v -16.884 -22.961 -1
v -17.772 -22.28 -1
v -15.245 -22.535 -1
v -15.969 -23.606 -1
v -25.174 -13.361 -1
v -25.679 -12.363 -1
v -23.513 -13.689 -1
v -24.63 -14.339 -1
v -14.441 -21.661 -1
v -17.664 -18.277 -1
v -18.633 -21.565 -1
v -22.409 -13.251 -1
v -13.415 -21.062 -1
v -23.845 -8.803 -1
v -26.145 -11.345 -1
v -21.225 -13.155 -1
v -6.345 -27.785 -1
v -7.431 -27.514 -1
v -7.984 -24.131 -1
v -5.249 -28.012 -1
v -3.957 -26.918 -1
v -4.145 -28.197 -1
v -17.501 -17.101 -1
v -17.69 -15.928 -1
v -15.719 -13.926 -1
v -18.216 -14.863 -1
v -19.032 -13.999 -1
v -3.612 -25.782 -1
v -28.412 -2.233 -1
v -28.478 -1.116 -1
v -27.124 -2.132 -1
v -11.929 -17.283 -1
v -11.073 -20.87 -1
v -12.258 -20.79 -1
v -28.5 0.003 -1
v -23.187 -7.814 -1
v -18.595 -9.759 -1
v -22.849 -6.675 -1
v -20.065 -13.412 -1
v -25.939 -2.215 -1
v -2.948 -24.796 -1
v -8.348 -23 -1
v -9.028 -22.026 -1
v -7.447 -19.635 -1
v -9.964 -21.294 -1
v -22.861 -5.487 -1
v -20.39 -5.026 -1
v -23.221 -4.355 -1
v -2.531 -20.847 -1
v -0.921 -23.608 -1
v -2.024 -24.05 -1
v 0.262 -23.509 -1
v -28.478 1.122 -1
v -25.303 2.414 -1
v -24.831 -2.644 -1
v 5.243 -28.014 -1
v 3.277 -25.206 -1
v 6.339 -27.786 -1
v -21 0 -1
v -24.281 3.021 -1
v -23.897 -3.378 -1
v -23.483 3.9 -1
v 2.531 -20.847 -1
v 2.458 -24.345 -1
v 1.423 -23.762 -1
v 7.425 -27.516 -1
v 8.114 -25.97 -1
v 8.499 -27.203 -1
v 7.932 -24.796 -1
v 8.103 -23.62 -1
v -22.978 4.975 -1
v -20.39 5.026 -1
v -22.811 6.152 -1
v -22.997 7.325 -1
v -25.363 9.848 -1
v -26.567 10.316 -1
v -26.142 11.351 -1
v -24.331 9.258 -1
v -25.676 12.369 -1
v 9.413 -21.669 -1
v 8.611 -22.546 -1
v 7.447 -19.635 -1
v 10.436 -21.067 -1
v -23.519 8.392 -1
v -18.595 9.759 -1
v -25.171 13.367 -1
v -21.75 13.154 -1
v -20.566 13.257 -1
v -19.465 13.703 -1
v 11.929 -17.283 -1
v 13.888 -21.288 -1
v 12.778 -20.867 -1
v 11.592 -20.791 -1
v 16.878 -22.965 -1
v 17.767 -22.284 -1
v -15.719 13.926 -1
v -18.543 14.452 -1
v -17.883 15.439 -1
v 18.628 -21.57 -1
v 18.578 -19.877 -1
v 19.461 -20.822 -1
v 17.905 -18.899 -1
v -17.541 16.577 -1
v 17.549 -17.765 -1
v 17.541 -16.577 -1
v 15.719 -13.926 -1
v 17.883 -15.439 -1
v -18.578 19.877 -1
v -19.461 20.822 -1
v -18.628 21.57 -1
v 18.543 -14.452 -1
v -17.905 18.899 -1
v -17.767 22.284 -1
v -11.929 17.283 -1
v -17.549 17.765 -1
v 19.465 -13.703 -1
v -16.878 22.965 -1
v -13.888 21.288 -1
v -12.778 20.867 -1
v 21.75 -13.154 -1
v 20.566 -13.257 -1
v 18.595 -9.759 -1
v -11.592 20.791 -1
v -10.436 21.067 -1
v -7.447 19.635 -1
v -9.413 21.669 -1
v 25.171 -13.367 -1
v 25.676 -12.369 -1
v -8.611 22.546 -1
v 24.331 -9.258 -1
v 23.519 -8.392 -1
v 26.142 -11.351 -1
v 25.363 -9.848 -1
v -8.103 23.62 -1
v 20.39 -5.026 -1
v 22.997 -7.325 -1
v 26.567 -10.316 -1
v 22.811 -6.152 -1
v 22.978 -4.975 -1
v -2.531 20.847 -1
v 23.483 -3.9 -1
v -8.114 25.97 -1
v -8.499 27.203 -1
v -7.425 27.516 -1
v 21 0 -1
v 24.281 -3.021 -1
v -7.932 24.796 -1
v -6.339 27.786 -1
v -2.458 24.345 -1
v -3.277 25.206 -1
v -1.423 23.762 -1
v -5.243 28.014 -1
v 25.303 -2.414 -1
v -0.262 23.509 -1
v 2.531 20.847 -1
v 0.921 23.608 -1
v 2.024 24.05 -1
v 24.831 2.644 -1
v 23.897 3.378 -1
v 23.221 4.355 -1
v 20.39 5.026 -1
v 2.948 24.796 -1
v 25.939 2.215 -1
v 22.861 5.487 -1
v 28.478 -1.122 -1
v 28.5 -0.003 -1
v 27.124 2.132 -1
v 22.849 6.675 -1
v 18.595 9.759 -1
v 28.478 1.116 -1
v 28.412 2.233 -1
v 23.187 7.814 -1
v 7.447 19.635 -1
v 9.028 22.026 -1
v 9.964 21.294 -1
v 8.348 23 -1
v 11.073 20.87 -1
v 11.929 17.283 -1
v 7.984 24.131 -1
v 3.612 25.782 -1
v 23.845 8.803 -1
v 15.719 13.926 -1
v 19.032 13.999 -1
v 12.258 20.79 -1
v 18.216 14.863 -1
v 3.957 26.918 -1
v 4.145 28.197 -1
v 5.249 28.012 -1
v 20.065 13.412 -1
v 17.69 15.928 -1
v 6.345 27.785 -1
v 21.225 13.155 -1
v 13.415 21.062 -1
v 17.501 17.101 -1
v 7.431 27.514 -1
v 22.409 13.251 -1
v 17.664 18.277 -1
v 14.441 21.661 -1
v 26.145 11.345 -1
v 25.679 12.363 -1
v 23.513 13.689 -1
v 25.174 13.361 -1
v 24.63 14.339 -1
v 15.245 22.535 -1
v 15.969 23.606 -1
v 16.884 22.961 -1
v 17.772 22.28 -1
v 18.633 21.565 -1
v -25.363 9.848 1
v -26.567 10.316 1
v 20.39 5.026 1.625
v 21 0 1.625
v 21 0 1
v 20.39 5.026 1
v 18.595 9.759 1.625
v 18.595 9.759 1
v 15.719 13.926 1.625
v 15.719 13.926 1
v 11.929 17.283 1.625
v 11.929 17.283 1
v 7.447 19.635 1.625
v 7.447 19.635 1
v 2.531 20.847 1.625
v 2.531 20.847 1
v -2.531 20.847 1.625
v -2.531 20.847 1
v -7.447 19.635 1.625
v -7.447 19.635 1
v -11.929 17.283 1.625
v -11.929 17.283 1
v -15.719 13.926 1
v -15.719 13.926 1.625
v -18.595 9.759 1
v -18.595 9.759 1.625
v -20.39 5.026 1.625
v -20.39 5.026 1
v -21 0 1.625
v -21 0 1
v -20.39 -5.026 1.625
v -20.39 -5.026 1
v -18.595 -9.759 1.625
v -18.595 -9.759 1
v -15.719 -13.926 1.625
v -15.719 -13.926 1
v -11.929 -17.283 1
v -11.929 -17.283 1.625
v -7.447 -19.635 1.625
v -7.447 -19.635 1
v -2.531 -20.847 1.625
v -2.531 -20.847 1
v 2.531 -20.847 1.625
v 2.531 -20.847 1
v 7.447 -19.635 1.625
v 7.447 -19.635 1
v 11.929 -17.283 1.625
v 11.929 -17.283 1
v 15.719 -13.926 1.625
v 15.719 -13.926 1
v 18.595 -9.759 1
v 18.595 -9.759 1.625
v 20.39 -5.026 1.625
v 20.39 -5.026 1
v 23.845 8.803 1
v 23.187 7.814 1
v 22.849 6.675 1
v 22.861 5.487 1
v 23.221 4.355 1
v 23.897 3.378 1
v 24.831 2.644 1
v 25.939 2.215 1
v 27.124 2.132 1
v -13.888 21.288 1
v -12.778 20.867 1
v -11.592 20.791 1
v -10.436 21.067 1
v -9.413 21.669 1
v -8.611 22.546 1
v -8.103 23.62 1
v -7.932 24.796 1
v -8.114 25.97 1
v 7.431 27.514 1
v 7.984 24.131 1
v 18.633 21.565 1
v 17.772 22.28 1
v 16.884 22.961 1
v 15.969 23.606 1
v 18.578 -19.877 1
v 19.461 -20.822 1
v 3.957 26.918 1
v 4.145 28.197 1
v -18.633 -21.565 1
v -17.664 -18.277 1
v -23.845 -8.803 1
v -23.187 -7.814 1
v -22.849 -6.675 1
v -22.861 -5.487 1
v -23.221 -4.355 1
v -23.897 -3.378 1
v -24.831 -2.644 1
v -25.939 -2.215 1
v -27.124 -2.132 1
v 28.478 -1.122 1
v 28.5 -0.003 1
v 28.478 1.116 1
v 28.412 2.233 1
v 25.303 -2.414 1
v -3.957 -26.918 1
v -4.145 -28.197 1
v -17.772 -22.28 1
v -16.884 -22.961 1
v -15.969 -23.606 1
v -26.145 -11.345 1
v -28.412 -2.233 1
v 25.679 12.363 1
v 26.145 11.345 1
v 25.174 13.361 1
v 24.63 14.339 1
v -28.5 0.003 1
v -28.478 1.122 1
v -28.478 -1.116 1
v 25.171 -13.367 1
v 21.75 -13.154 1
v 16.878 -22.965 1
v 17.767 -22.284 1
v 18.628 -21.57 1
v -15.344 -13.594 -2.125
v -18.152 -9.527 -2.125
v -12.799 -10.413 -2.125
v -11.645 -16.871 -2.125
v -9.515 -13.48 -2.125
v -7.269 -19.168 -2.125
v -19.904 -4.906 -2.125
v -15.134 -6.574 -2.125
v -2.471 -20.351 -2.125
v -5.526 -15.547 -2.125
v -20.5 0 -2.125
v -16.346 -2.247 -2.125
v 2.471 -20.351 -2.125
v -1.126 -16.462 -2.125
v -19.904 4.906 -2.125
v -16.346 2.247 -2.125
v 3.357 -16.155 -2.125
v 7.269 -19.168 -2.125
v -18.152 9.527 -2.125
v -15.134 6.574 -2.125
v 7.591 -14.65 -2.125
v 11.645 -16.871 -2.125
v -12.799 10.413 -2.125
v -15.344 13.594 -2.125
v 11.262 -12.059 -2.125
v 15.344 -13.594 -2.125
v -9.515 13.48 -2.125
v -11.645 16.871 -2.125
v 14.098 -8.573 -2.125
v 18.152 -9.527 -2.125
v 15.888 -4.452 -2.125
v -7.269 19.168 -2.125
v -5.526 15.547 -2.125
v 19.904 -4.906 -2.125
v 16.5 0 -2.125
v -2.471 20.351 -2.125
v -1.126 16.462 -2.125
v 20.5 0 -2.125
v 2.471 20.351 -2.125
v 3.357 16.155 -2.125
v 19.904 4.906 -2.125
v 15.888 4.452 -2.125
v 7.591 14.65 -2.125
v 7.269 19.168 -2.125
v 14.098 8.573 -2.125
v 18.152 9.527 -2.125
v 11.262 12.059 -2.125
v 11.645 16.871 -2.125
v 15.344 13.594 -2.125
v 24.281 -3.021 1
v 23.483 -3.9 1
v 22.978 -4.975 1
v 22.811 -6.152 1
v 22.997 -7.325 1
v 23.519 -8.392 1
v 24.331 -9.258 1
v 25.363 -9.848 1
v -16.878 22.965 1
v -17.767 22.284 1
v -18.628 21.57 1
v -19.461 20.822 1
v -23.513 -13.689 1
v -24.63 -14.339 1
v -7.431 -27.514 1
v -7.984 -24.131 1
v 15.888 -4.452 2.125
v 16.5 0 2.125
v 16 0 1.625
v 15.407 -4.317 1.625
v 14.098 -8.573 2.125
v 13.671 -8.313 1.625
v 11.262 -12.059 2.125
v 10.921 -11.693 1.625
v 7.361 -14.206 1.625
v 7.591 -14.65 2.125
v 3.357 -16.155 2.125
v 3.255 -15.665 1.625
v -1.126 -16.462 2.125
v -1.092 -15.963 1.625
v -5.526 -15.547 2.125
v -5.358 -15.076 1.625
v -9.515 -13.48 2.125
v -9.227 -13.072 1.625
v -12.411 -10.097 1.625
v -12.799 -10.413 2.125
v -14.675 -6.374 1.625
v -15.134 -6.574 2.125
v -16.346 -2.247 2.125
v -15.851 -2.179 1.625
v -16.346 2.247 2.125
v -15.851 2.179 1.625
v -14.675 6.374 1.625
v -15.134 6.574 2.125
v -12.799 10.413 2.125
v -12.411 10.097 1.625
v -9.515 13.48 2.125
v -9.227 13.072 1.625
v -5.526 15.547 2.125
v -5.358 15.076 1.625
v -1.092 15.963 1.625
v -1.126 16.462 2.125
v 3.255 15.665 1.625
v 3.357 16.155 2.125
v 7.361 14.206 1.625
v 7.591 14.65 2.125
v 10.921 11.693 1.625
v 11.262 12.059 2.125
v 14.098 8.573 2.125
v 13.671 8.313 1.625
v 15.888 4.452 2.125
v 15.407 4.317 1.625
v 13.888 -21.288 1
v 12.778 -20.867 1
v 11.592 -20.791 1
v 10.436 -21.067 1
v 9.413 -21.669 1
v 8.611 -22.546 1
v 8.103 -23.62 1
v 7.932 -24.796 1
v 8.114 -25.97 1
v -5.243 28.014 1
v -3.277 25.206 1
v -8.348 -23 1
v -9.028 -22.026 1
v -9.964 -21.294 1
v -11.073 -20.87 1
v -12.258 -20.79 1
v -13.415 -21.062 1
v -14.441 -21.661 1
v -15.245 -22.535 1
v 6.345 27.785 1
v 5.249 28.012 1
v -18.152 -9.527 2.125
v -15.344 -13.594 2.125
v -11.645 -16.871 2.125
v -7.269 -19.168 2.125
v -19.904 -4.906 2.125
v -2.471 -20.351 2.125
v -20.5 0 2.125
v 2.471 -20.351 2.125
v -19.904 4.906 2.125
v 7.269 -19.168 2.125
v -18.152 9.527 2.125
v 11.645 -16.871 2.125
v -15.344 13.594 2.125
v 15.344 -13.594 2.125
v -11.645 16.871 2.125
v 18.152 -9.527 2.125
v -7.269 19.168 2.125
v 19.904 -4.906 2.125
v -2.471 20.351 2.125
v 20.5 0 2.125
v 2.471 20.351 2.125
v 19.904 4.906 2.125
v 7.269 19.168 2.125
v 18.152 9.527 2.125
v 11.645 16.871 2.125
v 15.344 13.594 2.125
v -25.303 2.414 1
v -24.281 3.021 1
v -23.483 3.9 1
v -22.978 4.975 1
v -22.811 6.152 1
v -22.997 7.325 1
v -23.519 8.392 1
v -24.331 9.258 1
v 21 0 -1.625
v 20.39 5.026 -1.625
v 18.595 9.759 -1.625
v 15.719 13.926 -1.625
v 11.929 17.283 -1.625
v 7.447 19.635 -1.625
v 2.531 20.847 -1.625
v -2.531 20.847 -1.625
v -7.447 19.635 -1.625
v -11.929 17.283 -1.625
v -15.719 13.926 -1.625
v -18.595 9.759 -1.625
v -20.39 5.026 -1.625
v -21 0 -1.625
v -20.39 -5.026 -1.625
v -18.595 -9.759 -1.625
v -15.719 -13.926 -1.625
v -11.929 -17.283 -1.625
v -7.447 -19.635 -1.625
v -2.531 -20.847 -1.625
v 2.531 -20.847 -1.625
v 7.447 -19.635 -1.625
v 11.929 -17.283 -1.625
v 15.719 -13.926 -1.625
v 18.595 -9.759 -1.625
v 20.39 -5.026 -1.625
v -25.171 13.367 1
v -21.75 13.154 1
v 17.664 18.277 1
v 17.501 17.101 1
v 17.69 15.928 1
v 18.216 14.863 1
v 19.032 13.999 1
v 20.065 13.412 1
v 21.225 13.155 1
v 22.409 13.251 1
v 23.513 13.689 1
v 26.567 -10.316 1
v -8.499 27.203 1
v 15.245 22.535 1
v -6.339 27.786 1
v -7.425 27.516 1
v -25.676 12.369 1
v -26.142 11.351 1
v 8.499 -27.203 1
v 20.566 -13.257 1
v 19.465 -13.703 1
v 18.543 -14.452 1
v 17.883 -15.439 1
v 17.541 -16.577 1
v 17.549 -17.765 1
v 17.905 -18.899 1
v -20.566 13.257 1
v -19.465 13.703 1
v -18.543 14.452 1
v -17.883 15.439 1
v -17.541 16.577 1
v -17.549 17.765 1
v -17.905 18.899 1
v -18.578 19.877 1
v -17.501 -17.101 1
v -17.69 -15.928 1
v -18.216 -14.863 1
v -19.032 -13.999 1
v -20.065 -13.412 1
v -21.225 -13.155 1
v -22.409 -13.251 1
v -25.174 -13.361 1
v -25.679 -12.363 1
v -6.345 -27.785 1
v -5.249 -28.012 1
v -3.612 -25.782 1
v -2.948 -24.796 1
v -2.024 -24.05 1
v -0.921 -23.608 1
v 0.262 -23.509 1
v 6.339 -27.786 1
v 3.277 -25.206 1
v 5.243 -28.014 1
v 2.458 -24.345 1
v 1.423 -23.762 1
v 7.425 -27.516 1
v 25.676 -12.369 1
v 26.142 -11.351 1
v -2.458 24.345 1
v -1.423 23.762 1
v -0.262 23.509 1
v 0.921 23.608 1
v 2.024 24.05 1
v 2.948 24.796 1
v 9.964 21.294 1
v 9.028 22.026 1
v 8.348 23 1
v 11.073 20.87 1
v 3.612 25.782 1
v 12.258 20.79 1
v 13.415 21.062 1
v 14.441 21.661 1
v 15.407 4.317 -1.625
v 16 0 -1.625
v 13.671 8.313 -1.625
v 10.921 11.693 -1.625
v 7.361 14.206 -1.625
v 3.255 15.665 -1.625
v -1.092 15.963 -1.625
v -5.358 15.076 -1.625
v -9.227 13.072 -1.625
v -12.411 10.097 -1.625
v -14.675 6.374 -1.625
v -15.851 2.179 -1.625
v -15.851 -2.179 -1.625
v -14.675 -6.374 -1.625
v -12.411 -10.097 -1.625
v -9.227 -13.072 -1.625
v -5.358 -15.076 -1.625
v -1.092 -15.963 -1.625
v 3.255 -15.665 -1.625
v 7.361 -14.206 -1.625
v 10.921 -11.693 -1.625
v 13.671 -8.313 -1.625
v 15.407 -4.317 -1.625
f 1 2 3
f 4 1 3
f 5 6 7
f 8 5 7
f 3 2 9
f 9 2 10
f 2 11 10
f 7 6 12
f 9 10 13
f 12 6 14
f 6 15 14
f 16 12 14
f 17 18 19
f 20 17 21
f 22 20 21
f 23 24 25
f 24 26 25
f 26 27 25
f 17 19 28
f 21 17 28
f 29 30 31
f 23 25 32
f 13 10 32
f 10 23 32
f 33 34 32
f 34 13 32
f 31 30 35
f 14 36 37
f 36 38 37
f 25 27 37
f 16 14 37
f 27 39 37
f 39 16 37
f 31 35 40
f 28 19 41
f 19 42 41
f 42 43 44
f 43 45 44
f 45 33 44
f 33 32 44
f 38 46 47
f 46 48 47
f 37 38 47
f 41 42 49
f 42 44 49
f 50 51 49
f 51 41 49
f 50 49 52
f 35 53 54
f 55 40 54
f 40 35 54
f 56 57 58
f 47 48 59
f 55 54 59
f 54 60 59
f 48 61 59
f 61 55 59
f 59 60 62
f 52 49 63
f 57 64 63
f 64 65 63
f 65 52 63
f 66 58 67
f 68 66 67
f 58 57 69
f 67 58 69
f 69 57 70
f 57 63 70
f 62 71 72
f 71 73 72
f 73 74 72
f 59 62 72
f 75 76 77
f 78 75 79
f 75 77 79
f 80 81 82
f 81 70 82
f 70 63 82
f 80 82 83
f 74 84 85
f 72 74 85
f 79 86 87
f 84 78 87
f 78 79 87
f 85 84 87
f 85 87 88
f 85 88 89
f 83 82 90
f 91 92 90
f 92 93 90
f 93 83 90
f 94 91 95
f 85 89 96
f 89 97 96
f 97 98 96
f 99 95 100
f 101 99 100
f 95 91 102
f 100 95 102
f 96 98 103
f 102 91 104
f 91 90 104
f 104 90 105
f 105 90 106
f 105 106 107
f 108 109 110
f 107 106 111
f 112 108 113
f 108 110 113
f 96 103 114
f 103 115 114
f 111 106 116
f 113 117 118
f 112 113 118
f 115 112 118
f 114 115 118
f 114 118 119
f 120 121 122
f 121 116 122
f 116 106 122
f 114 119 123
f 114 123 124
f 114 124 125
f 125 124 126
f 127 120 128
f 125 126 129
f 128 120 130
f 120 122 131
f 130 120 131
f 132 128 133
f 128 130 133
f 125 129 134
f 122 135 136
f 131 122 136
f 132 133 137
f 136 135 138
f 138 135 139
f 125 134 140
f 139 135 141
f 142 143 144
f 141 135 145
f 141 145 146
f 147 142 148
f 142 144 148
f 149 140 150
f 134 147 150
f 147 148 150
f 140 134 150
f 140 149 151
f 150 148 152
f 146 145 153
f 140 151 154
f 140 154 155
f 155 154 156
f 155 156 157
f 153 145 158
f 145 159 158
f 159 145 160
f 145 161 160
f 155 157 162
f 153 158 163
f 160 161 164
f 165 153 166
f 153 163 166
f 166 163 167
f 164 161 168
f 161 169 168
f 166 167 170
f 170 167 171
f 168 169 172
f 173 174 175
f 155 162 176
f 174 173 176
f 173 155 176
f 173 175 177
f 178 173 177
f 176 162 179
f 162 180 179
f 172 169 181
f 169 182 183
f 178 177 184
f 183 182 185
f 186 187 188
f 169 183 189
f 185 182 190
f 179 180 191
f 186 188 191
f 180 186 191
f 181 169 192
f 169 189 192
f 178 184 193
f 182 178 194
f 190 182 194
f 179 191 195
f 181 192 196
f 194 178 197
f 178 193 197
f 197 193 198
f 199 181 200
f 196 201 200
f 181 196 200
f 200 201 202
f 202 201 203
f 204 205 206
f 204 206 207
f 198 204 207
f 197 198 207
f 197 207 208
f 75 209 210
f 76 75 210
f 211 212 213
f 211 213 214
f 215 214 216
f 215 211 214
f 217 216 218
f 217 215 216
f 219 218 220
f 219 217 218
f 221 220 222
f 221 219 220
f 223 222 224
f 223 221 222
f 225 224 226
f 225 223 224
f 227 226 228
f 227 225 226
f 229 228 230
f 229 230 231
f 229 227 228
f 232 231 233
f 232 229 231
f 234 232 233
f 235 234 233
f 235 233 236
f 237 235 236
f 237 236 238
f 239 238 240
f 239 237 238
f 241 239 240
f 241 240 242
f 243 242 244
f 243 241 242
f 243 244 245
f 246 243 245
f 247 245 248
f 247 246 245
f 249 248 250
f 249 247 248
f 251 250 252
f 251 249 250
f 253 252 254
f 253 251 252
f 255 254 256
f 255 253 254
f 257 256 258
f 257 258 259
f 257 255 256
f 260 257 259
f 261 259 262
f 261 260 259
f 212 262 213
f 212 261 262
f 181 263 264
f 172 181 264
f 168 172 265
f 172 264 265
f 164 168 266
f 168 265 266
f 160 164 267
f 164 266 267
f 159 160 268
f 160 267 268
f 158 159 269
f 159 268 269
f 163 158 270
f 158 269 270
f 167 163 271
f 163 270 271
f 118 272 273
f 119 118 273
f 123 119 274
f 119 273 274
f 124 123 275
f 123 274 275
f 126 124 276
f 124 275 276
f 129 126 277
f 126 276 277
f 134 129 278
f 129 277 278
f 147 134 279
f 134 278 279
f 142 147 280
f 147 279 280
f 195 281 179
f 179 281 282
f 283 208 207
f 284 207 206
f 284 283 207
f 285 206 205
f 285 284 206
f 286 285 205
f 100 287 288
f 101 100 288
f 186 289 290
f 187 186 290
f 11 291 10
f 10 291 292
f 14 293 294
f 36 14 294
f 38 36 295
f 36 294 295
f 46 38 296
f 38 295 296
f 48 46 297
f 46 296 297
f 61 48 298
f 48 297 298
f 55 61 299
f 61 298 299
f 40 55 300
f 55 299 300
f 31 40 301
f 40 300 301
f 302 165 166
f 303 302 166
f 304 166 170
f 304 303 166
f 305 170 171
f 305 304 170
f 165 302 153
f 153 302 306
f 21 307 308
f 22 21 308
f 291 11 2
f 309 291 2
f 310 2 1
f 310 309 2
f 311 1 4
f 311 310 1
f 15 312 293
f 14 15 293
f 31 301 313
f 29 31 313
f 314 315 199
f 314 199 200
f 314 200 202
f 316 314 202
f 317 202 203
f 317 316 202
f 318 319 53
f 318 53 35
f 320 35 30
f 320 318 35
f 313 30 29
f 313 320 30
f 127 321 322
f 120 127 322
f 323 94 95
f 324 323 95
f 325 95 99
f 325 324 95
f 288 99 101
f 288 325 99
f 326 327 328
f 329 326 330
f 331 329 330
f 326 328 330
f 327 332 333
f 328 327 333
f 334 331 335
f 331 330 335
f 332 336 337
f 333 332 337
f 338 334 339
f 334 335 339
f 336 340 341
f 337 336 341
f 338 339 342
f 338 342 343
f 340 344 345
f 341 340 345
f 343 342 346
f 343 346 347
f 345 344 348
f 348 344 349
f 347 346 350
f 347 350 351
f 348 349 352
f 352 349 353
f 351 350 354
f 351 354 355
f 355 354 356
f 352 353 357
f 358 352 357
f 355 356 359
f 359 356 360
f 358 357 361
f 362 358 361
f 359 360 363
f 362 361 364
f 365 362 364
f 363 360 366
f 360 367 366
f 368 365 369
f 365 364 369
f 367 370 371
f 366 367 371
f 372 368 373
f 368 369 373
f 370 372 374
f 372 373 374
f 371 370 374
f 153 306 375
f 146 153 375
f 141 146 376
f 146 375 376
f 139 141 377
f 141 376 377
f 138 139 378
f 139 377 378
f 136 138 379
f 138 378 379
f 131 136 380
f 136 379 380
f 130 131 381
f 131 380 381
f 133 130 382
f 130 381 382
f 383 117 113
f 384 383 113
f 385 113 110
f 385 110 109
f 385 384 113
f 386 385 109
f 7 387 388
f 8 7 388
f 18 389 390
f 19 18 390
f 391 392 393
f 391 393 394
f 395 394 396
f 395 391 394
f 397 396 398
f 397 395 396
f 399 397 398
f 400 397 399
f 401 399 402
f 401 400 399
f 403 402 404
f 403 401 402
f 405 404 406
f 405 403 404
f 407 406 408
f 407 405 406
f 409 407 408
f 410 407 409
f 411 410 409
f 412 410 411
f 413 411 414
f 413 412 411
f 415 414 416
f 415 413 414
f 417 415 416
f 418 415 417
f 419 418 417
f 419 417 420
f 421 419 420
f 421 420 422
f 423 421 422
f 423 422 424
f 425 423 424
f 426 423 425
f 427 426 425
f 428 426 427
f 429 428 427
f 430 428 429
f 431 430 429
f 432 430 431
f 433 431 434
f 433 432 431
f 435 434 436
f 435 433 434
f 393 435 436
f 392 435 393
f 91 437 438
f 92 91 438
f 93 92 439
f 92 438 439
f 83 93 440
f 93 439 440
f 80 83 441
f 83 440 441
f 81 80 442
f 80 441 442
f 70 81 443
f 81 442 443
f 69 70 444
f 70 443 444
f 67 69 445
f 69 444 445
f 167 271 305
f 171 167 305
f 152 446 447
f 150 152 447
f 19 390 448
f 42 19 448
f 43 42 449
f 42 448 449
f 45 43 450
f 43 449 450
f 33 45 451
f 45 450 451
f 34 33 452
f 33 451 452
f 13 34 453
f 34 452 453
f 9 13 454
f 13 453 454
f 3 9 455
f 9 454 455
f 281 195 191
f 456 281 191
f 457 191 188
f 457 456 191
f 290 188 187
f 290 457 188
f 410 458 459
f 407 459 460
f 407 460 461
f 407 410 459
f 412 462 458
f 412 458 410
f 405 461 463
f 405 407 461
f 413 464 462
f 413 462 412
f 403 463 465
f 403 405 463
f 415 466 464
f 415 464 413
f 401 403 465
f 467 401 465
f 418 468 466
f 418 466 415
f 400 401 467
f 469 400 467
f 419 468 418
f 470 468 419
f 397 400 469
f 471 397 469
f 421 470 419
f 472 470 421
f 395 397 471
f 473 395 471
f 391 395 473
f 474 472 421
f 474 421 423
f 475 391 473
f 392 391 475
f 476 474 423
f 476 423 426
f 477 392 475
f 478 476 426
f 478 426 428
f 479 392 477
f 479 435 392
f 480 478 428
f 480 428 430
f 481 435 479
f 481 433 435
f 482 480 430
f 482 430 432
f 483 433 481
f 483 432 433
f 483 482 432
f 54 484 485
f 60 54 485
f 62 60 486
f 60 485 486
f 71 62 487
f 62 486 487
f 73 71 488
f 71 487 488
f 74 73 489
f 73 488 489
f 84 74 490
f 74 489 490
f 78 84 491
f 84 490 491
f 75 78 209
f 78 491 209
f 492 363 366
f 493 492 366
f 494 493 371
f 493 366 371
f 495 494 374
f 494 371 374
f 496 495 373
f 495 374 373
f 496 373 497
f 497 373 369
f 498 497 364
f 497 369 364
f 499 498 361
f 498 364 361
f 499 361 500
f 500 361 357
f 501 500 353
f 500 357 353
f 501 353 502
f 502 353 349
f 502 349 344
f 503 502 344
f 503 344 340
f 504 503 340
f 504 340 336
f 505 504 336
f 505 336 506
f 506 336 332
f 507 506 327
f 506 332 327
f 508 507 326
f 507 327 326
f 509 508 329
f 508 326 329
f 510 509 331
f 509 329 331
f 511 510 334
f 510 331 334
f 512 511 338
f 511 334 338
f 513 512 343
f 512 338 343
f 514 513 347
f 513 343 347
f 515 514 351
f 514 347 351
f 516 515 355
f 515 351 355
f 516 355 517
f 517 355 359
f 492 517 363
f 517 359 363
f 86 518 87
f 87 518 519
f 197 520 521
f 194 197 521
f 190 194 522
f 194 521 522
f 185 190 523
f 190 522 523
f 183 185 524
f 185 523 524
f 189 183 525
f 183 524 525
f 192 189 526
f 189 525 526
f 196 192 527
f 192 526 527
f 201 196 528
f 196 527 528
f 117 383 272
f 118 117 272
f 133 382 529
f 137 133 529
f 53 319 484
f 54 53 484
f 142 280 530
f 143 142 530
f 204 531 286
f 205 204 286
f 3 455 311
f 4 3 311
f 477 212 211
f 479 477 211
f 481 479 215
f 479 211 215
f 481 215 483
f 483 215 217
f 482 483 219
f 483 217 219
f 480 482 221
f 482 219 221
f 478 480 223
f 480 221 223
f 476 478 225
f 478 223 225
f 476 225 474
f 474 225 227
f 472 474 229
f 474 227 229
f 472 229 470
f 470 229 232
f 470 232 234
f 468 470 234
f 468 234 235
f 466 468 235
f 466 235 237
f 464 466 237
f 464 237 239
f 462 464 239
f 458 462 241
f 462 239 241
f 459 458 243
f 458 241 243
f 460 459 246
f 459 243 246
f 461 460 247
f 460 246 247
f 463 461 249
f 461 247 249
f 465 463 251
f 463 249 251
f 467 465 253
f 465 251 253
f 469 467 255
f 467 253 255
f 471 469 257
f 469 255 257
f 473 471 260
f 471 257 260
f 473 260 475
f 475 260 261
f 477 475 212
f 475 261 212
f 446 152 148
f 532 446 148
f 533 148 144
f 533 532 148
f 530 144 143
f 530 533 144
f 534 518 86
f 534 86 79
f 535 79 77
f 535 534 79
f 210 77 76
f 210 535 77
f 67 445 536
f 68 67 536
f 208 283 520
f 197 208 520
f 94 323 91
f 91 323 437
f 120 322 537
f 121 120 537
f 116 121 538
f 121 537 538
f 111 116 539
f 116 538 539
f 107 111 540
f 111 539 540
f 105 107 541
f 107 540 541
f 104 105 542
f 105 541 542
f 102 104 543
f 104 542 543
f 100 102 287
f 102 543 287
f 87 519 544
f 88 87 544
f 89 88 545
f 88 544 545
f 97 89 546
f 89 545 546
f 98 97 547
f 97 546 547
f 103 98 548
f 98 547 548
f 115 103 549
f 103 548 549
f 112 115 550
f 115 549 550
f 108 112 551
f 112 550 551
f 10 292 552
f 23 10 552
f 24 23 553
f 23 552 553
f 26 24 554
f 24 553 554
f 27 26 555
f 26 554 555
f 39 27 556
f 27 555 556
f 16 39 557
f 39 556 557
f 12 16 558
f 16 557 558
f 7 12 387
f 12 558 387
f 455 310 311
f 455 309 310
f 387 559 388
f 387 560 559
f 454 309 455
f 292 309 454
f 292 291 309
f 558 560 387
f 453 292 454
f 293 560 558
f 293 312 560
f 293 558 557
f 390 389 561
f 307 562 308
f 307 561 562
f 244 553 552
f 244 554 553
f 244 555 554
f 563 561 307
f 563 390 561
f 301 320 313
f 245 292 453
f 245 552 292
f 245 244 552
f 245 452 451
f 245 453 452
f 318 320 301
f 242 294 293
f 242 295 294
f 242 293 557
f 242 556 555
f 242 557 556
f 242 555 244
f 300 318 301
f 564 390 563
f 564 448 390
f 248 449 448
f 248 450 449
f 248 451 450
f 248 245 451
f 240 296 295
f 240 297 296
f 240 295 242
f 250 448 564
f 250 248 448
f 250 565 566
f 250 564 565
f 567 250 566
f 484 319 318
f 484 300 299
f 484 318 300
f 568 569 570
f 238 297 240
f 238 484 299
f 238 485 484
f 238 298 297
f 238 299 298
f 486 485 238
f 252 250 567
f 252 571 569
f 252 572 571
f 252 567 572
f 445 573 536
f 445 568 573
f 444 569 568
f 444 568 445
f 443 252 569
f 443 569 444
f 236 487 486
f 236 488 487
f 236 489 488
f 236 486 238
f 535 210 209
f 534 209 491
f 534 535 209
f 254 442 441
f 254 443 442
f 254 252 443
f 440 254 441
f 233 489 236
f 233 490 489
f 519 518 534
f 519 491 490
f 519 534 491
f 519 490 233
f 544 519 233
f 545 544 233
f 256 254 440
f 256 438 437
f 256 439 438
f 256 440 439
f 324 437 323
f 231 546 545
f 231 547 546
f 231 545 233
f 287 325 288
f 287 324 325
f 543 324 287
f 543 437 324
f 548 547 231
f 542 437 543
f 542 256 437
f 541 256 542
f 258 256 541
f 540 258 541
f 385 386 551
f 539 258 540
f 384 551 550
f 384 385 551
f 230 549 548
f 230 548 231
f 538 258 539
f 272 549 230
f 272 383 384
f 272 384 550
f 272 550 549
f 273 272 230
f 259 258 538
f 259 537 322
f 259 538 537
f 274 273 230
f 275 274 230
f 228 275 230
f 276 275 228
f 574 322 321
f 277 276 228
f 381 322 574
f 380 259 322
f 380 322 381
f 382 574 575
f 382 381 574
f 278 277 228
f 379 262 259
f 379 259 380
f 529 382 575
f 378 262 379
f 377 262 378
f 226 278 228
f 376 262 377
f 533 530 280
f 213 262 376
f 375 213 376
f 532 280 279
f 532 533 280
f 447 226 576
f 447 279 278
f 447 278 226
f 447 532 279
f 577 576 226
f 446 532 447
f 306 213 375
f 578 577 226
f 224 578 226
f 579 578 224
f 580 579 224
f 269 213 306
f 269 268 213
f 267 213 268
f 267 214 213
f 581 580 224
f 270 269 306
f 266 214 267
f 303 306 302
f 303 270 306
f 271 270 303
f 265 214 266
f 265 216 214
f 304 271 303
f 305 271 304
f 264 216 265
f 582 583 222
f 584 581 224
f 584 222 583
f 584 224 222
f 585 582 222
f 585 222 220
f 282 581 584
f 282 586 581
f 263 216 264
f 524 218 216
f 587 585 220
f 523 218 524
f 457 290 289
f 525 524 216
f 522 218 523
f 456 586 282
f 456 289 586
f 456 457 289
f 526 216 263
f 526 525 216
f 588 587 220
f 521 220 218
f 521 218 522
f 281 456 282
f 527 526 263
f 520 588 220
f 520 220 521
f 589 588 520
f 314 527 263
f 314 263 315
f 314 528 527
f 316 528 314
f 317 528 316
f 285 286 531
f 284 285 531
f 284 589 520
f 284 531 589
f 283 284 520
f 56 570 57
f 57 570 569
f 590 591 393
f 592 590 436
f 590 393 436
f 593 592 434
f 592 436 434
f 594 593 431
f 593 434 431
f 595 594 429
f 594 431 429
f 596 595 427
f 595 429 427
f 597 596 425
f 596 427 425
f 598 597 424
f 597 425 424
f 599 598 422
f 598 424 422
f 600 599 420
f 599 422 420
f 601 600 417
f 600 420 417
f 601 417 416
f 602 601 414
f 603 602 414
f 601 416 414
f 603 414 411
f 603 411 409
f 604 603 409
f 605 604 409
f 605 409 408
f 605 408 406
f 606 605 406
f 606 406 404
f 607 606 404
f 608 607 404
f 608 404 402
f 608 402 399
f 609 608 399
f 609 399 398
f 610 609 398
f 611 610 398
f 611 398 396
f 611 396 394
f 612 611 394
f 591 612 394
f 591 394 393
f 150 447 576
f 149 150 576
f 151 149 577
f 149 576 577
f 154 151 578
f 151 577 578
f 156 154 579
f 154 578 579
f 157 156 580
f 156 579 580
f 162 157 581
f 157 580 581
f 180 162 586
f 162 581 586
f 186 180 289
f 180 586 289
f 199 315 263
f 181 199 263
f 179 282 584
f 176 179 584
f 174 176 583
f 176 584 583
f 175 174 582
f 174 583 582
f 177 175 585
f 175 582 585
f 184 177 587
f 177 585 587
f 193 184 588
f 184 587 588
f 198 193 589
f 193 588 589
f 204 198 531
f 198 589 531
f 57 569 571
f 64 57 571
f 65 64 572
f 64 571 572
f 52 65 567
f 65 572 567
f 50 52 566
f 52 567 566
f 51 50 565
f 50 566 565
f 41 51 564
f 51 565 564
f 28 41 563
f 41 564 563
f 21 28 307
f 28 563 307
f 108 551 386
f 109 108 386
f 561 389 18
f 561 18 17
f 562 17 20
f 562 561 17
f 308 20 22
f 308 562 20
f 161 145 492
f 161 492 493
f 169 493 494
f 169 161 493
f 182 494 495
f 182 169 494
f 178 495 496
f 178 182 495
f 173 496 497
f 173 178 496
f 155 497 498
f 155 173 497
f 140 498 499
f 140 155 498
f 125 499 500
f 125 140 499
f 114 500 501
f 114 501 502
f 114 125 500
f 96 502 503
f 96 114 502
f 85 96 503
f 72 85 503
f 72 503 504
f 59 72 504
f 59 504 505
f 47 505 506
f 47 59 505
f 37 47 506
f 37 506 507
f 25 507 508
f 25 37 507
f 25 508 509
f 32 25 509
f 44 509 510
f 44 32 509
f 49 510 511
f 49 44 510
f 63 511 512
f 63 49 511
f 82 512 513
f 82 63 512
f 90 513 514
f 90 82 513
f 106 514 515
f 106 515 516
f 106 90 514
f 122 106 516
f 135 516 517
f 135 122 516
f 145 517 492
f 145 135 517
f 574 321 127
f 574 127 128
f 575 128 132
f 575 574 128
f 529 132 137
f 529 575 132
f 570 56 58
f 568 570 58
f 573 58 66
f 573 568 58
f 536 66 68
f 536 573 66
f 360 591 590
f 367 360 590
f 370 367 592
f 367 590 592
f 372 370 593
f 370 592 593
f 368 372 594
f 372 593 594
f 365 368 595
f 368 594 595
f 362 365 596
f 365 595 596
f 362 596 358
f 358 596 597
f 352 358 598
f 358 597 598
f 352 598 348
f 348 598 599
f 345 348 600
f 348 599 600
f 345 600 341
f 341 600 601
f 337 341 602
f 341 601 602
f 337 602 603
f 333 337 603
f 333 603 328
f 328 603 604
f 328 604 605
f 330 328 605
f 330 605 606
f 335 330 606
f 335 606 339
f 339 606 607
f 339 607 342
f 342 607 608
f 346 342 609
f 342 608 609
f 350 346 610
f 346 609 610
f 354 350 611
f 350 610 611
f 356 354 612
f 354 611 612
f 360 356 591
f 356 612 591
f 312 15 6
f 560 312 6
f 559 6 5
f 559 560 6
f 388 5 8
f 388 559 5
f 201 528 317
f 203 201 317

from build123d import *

# Parameters (mm, degrees)
ESQUISSE1_R                  = 28.5
EXTRUSION1_DEPTH             = 1
ENL_V_MAT_EXTRU_1_DEPTH      = 2
R_P_TITION_CIRCULAIRE1_COUNT = 14
ESQUISSE3_R                  = 21
EXTRUSION2_DEPTH             = 2.125
ESQUISSE4_R                  = 16
ENL_V_MAT_EXTRU_2_DEPTH      = 3.125
ENL_V_MAT_EXTRU_2_DEPTH_BACK = 3.125
CHANFREIN1_SIZE              = 0.5


with BuildPart() as part:
    # Esquisse1 → Extrusion1 (new body, symmetric)
    with BuildSketch(Plane.XY):
        Circle(ESQUISSE1_R)
    extrude(amount=EXTRUSION1_DEPTH, both=True)

    # Esquisse2 → Enlèv. mat.-Extru.1 (cut, symmetric)
    with BuildSketch(Plane.XY):
        with BuildLine():
            Line((-5.2427476, 28.013632353), (-3.276608177, 25.205694255))
            ThreePointArc((-3.276608177, 25.205694255), (0.921435362, 23.607576992), (3.957459741, 26.918181818))
            Line((3.957459741, 26.918181818), (4.145454545, 28.196900656))
            ThreePointArc((4.145454545, 28.196900656), (-0.556246195, 28.49457124), (-5.2427476, 28.013632353))
        make_face()
    enl_v_mat_extru_1 = extrude(amount=ENL_V_MAT_EXTRU_1_DEPTH, both=True, mode=Mode.SUBTRACT)

    # Répétition circulaire1: Enlèv. mat.-Extru.1 ×14 about axis
    r_p_tition_circulaire1_axis = Axis((0, 0, 0), (0, 0, 1))
    for i in range(1, R_P_TITION_CIRCULAIRE1_COUNT):
        add(enl_v_mat_extru_1.rotate(r_p_tition_circulaire1_axis, i * 360 / R_P_TITION_CIRCULAIRE1_COUNT), mode=Mode.SUBTRACT)

    # Esquisse3 → Extrusion2 (add, symmetric)
    with BuildSketch(Plane.XY):
        Circle(ESQUISSE3_R)
    extrude(amount=EXTRUSION2_DEPTH, both=True)

    # Esquisse4 → Enlèv. mat.-Extru.2 (cut, two sides)
    with BuildSketch(Plane.XY) as enl_v_mat_extru_2_sk:
        Circle(ESQUISSE4_R)
    extrude(amount=ENL_V_MAT_EXTRU_2_DEPTH, mode=Mode.SUBTRACT)
    extrude(enl_v_mat_extru_2_sk.sketch, amount=-ENL_V_MAT_EXTRU_2_DEPTH_BACK, mode=Mode.SUBTRACT)

    # Chanfrein1
    chanfrein1_edges = [part.edges().sort_by_distance(p)[0] for p in [
        (-21, 0, -2.125),
        (-21, 0, 2.125),
        (-16, 0, -2.125),
        (-16, 0, 2.125),
    ]]
    chamfer(chanfrein1_edges, length=CHANFREIN1_SIZE)


solid = part.part
